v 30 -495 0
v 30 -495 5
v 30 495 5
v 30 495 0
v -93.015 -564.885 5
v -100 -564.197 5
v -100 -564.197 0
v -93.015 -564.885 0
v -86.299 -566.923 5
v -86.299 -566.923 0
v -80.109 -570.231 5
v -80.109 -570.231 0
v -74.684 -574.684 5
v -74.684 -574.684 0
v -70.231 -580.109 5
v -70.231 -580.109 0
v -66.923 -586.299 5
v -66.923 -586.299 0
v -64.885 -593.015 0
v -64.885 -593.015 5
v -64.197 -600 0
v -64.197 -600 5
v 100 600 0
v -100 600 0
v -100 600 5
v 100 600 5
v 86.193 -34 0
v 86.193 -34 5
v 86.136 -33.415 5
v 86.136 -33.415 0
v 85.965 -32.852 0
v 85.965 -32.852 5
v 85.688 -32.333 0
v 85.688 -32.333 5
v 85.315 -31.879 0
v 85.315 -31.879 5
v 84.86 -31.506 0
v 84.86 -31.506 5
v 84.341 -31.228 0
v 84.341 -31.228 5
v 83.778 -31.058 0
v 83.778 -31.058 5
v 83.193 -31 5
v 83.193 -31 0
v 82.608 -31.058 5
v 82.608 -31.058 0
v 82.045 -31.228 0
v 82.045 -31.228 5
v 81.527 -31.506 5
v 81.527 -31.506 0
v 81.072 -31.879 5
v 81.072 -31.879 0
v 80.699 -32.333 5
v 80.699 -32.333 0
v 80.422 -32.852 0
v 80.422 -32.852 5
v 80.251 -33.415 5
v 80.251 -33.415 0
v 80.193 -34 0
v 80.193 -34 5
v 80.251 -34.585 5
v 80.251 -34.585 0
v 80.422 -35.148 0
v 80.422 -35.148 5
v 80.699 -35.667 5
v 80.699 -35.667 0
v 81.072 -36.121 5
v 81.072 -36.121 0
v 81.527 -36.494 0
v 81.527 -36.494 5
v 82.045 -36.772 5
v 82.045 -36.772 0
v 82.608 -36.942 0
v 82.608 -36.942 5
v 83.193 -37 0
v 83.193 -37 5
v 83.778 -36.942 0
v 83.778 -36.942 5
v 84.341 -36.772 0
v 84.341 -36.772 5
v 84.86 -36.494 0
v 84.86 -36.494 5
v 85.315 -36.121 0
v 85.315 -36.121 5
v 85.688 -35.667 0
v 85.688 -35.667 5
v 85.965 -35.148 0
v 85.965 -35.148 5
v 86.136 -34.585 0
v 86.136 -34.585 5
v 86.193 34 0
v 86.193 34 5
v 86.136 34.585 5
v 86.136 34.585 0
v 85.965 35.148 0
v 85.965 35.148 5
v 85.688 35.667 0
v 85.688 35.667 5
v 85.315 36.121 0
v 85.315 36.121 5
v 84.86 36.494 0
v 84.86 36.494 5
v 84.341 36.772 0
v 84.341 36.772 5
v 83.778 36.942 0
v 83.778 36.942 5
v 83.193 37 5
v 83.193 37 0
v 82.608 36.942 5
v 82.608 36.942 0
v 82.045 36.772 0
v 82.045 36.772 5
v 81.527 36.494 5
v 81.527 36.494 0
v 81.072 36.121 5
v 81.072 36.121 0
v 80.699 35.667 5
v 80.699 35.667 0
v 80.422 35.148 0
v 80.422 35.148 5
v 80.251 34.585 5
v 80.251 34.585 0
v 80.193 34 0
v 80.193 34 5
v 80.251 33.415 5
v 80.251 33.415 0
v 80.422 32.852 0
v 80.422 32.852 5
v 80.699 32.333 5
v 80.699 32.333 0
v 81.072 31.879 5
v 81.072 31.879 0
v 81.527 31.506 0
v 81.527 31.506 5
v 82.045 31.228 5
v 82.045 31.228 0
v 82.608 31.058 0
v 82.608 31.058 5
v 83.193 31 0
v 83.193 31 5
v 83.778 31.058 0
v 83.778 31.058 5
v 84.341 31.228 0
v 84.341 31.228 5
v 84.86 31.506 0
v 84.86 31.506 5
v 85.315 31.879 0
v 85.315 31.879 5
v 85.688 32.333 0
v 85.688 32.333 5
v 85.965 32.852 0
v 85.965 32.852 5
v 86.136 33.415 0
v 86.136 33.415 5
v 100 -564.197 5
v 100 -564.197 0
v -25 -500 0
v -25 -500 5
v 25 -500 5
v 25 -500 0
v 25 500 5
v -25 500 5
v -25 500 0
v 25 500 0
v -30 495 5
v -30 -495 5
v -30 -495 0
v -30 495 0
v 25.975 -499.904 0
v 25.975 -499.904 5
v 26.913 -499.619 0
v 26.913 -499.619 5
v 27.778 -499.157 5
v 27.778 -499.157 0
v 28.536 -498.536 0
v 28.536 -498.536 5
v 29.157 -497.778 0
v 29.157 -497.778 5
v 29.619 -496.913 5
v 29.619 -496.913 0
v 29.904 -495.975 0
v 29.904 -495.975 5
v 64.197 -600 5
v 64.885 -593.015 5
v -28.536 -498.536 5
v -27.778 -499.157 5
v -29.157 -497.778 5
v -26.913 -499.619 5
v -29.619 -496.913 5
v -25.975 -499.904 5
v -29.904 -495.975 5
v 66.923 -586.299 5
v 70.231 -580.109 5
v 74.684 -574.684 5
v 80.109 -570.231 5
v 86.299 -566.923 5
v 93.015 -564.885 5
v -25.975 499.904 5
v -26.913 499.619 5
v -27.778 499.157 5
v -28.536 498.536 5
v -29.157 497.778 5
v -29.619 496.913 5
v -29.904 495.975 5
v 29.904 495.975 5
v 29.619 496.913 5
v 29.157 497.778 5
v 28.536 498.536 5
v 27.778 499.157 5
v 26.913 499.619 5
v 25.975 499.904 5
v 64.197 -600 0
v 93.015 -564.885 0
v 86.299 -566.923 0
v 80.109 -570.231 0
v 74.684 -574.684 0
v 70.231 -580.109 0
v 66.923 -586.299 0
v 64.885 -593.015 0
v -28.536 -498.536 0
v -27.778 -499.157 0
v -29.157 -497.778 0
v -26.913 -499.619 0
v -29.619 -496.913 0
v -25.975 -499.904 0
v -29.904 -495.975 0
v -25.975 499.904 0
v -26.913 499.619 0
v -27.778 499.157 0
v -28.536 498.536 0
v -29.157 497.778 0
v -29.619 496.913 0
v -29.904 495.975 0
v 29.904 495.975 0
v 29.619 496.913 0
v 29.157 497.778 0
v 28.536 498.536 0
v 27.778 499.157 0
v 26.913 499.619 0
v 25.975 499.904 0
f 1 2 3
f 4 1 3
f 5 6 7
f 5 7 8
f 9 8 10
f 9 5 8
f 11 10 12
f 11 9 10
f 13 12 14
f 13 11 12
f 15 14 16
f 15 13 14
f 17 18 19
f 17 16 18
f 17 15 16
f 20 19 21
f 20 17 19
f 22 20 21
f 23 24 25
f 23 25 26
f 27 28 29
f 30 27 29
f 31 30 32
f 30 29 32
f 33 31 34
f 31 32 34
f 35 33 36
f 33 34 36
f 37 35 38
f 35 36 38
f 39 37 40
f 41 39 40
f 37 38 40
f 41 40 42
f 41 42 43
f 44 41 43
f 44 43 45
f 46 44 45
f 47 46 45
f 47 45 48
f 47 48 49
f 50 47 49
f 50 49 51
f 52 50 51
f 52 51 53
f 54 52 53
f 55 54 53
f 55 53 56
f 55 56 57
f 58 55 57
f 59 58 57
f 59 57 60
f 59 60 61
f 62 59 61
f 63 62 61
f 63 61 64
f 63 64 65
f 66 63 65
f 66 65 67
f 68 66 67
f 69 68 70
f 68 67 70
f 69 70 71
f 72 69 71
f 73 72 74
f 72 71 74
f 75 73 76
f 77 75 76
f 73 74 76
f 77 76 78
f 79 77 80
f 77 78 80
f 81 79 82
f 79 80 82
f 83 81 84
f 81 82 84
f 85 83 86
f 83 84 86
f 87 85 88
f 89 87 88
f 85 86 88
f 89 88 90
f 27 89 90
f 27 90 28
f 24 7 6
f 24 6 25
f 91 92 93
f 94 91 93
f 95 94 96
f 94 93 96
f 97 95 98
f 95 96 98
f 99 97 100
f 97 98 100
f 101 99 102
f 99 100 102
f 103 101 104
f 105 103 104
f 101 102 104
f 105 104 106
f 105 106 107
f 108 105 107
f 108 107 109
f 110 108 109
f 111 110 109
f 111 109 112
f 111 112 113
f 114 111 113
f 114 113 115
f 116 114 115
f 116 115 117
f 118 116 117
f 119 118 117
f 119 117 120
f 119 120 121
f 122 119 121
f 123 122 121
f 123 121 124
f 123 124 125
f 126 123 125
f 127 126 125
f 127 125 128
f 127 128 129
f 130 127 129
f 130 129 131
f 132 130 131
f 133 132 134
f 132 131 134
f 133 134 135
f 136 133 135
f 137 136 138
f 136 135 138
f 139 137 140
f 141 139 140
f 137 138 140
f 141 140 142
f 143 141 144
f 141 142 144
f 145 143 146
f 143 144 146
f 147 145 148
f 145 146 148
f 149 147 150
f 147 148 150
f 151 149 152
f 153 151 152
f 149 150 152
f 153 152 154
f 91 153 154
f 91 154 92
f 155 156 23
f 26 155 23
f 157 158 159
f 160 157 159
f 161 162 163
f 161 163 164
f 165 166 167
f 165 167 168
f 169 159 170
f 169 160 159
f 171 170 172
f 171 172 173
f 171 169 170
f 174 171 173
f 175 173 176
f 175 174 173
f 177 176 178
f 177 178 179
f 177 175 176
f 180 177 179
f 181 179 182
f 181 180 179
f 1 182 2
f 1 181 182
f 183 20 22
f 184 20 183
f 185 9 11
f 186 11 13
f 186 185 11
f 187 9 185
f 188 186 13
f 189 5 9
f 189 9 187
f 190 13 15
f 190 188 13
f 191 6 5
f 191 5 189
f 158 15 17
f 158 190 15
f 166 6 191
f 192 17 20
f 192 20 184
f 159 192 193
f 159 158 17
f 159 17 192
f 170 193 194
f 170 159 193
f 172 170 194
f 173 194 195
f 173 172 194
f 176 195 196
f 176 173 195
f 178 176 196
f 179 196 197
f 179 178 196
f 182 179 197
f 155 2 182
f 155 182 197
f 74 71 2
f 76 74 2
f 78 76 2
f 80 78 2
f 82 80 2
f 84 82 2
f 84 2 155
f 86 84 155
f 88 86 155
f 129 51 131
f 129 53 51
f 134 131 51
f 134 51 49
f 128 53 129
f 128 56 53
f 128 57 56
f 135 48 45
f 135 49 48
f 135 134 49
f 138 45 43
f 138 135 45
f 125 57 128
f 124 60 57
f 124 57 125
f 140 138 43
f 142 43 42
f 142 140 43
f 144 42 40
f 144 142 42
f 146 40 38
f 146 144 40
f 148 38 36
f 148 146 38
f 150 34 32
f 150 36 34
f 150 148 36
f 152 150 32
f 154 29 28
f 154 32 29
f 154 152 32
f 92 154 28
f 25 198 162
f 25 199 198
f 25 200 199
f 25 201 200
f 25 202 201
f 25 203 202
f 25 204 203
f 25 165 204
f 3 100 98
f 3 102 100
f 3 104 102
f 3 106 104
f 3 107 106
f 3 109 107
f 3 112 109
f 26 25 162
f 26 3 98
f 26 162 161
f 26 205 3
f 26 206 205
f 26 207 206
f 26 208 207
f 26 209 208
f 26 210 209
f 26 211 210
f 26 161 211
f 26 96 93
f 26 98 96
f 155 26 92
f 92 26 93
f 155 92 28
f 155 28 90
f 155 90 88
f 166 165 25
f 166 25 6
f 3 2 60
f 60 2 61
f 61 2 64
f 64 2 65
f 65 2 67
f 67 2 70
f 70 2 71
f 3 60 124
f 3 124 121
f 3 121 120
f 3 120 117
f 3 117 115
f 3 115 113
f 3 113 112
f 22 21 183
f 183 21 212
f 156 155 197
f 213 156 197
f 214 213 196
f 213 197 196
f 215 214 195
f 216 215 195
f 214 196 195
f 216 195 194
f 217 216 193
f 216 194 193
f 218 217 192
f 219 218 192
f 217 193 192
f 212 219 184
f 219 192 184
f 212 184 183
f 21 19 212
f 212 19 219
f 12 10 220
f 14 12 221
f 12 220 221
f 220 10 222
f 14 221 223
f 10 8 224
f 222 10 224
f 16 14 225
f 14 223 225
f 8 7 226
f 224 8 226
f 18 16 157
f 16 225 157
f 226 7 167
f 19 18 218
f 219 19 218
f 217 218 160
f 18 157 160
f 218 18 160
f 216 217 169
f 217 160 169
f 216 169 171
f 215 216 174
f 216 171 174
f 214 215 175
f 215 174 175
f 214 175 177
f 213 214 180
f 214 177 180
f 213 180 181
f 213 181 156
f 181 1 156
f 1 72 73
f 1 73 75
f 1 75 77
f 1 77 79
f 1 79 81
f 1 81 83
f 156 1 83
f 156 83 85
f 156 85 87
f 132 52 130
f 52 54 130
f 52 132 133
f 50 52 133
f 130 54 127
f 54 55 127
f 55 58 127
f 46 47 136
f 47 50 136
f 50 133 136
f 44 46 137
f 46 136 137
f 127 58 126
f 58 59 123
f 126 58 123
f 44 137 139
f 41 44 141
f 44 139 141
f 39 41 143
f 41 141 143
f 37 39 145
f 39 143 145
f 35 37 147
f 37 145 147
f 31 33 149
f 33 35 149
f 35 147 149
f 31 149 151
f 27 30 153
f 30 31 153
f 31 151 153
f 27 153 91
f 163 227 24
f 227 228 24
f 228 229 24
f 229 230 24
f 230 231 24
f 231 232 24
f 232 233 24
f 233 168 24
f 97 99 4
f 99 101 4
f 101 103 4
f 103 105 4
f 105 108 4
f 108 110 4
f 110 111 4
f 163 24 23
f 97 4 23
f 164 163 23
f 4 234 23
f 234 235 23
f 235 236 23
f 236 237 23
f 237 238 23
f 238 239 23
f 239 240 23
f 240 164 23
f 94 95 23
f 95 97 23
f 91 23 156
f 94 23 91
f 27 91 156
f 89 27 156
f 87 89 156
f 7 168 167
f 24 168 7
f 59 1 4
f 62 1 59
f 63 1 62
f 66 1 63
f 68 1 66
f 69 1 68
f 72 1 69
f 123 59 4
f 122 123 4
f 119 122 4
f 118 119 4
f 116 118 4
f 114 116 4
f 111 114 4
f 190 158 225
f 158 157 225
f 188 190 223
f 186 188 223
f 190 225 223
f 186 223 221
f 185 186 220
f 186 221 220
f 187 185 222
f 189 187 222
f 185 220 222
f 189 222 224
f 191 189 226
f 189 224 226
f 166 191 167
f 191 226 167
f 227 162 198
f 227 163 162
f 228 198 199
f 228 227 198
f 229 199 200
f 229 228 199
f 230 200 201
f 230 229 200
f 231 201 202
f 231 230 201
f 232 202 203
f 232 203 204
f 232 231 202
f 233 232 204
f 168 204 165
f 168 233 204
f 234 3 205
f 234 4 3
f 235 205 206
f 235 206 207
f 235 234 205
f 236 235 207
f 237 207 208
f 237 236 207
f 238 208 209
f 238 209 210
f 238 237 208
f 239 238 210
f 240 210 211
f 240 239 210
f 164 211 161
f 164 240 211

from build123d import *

# Parameters (mm, degrees)
SKETCH1_W           = 200
SKETCH1_H           = 1200
BOSS_EXTRUDE1_DEPTH = 5
CUT_EXTRUDE1_DEPTH  = 609.296802556
SKETCH5_W           = 60
SKETCH5_H           = 1000
CUT_EXTRUDE3_DEPTH  = 609.296802556
FILLET2_R           = 5
SKETCH6_R           = 3
CUT_EXTRUDE4_DEPTH  = 609.296802556


with BuildPart() as part:
    # Sketch1 → Boss-Extrude1 (new body)
    with BuildSketch(Plane.XY):
        Rectangle(SKETCH1_W, SKETCH1_H)
    extrude(amount=BOSS_EXTRUDE1_DEPTH)

    # Sketch3 → Cut-Extrude1 (cut, through all)
    with BuildSketch(Plane.XY.offset(5)):
        with BuildLine():
            Line((-100, -600), (-100, -564.197190266))
            ThreePointArc((-100, -564.197190266), (-74.683590452, -574.683590452), (-64.197190266, -600))
            Line((-64.197190266, -600), (-100, -600))
        make_face()
        with BuildLine():
            Line((64.197190266, -600), (100, -600))
            Line((100, -600), (100, -564.197190266))
            ThreePointArc((100, -564.197190266), (74.683590452, -574.683590452), (64.197190266, -600))
        make_face()
    extrude(amount=-CUT_EXTRUDE1_DEPTH, mode=Mode.SUBTRACT)

    # Sketch5 → Cut-Extrude3 (cut, through all)
    with BuildSketch(Plane.XY.offset(5)):
        Rectangle(SKETCH5_W, SKETCH5_H)
    extrude(amount=-CUT_EXTRUDE3_DEPTH, mode=Mode.SUBTRACT)

    # Fillet2
    fillet2_edges = [part.edges().sort_by_distance(p)[0] for p in [
        (30, 500, 2.5),
        (30, -500, 2.5),
        (-30, -500, 2.5),
        (-30, 500, 2.5),
    ]]
    fillet(fillet2_edges, radius=FILLET2_R)

    # Sketch6 → Cut-Extrude4 (cut, through all)
    with BuildSketch(Plane.XY.offset(5)):
        with Locations((83.193225438, -34)):
            Circle(SKETCH6_R)
        with Locations((83.193225438, 34)):
            Circle(SKETCH6_R)
    extrude(amount=-CUT_EXTRUDE4_DEPTH, mode=Mode.SUBTRACT)


solid = part.part
